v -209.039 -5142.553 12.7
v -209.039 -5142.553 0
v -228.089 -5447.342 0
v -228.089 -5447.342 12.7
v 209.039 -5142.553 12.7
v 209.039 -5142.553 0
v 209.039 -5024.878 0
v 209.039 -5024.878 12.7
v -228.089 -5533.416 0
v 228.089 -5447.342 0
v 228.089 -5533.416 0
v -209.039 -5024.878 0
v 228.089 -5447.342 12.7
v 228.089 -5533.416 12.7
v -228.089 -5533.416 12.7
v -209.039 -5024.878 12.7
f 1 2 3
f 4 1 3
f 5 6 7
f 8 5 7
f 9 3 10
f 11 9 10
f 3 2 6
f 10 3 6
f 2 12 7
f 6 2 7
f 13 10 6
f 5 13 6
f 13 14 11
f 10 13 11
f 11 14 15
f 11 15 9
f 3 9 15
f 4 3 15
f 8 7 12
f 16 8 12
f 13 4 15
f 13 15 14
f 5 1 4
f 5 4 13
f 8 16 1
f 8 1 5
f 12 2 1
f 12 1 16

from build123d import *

# Parameters (mm, degrees)
SKETCH1_W           = 418.07892
SKETCH1_H           = 415.925
BOSS_EXTRUDE1_DEPTH = 12.7
SKETCH2_W           = 418.07892
SKETCH2_H           = 79.68996
BOSS_EXTRUDE2_DEPTH = 12.7
SKETCH3_W           = 418.07892
SKETCH3_H           = 28.376126504
BOSS_EXTRUDE3_DEPTH = 12.7
BOSS_EXTRUDE4_DEPTH = 12.7
CHAMFER1_SIZE       = 304.8
CHAMFER1_SIZE_2     = 19.05
SKETCH5_W           = 12.7
SKETCH5_H           = 15.453987587
CUT_EXTRUDE1_DEPTH  = 5568.603780331


with BuildPart() as part:
    # Sketch1 → Boss-Extrude1 (new body)
    with BuildSketch(Plane.XY):
        with Locations((0, -5261.217030575)):
            Rectangle(SKETCH1_W, SKETCH1_H)
    extrude(amount=BOSS_EXTRUDE1_DEPTH)

    # Sketch2 → Boss-Extrude2 (add, through all)
    with BuildSketch(Plane(origin=(0, 0, 0), x_dir=(-1, 0, 0), z_dir=(0, 0, -1))):
        with Locations((0, -5509.024510575)):
            Rectangle(SKETCH2_W, SKETCH2_H)
    extrude(amount=-BOSS_EXTRUDE2_DEPTH)

    # Sketch3 → Boss-Extrude3 (add, through all)
    with BuildSketch(Plane(origin=(0, 0, 0), x_dir=(-1, 0, 0), z_dir=(0, 0, -1))):
        with Locations((0, -5039.066467323)):
            Rectangle(SKETCH3_W, SKETCH3_H)
    extrude(amount=-BOSS_EXTRUDE3_DEPTH)

    # Sketch4 → Boss-Extrude4 (add, through all)
    with BuildSketch(Plane(origin=(0, 0, 0), x_dir=(-1, 0, 0), z_dir=(0, 0, -1))):
        Polygon((209.038766336, -5447.352766987), (228.088766336, -5447.352766987), (228.088766336, -5548.869490575), (209.03946, -5548.869490575), align=None)
        Polygon((-209.03946, -5548.869490575), (-209.038766336, -5447.352766987), (-228.088766336, -5447.352766987), (-228.088766336, -5548.869490575), align=None)
    extrude(amount=-BOSS_EXTRUDE4_DEPTH)

    # Chamfer1
    # the kernel refuses this chamfer: 304.8, 19.05 mm, written as the material it adds along each edge
    with BuildSketch(Plane(origin=(-209.03946, -5447.352766987, 0), x_dir=(0.002399337658707147, 0.9999971215852571, 0), z_dir=(0, 0, 1))) as chamfer1_piece_1_section:
        Polygon((CHAMFER1_SIZE * 0.999997121585, CHAMFER1_SIZE * 0.00239933765871), (-CHAMFER1_SIZE_2 * 0.00239933765871, CHAMFER1_SIZE_2 * 0.999997121585), (0, 0), align=None)
    chamfer1_piece_1 = extrude(amount=12.7, mode=Mode.PRIVATE)
    chamfer1_piece_1 = split(chamfer1_piece_1, bisect_by=Plane(origin=(-228.088766336, -5325.682018196, 6.35), z_dir=(1, 0, 0)), keep=Keep.TOP, mode=Mode.PRIVATE)
    add(chamfer1_piece_1)
    with BuildSketch(Plane(origin=(209.03946, -5447.352766987, 0), x_dir=(0.8520963193143735, -0.5233850041899339, 0), z_dir=(0, 0, 1))) as chamfer1_piece_2_section:
        Polygon((CHAMFER1_SIZE_2 * 0.852096319314, CHAMFER1_SIZE_2 * 0.52338500419), (-CHAMFER1_SIZE * 0.52338500419, CHAMFER1_SIZE * 0.852096319314), (0, 0), align=None)
    chamfer1_piece_2 = extrude(amount=12.7, mode=Mode.PRIVATE)
    chamfer1_piece_2 = split(chamfer1_piece_2, bisect_by=Plane(origin=(228.088766336, -5325.682018196, 6.35), z_dir=(-1, 0, 0)), keep=Keep.TOP, mode=Mode.PRIVATE)
    add(chamfer1_piece_2)

    # Sketch5 → Cut-Extrude1 (cut, through all)
    with BuildSketch(Plane(origin=(228.088766336, 0, 0), x_dir=(0, 0, -1), z_dir=(1, 0, 0))):
        with Locations((-6.35, -5541.142496782)):
            Rectangle(SKETCH5_W, SKETCH5_H)
    extrude(amount=-CUT_EXTRUDE1_DEPTH, mode=Mode.SUBTRACT)


solid = part.part
